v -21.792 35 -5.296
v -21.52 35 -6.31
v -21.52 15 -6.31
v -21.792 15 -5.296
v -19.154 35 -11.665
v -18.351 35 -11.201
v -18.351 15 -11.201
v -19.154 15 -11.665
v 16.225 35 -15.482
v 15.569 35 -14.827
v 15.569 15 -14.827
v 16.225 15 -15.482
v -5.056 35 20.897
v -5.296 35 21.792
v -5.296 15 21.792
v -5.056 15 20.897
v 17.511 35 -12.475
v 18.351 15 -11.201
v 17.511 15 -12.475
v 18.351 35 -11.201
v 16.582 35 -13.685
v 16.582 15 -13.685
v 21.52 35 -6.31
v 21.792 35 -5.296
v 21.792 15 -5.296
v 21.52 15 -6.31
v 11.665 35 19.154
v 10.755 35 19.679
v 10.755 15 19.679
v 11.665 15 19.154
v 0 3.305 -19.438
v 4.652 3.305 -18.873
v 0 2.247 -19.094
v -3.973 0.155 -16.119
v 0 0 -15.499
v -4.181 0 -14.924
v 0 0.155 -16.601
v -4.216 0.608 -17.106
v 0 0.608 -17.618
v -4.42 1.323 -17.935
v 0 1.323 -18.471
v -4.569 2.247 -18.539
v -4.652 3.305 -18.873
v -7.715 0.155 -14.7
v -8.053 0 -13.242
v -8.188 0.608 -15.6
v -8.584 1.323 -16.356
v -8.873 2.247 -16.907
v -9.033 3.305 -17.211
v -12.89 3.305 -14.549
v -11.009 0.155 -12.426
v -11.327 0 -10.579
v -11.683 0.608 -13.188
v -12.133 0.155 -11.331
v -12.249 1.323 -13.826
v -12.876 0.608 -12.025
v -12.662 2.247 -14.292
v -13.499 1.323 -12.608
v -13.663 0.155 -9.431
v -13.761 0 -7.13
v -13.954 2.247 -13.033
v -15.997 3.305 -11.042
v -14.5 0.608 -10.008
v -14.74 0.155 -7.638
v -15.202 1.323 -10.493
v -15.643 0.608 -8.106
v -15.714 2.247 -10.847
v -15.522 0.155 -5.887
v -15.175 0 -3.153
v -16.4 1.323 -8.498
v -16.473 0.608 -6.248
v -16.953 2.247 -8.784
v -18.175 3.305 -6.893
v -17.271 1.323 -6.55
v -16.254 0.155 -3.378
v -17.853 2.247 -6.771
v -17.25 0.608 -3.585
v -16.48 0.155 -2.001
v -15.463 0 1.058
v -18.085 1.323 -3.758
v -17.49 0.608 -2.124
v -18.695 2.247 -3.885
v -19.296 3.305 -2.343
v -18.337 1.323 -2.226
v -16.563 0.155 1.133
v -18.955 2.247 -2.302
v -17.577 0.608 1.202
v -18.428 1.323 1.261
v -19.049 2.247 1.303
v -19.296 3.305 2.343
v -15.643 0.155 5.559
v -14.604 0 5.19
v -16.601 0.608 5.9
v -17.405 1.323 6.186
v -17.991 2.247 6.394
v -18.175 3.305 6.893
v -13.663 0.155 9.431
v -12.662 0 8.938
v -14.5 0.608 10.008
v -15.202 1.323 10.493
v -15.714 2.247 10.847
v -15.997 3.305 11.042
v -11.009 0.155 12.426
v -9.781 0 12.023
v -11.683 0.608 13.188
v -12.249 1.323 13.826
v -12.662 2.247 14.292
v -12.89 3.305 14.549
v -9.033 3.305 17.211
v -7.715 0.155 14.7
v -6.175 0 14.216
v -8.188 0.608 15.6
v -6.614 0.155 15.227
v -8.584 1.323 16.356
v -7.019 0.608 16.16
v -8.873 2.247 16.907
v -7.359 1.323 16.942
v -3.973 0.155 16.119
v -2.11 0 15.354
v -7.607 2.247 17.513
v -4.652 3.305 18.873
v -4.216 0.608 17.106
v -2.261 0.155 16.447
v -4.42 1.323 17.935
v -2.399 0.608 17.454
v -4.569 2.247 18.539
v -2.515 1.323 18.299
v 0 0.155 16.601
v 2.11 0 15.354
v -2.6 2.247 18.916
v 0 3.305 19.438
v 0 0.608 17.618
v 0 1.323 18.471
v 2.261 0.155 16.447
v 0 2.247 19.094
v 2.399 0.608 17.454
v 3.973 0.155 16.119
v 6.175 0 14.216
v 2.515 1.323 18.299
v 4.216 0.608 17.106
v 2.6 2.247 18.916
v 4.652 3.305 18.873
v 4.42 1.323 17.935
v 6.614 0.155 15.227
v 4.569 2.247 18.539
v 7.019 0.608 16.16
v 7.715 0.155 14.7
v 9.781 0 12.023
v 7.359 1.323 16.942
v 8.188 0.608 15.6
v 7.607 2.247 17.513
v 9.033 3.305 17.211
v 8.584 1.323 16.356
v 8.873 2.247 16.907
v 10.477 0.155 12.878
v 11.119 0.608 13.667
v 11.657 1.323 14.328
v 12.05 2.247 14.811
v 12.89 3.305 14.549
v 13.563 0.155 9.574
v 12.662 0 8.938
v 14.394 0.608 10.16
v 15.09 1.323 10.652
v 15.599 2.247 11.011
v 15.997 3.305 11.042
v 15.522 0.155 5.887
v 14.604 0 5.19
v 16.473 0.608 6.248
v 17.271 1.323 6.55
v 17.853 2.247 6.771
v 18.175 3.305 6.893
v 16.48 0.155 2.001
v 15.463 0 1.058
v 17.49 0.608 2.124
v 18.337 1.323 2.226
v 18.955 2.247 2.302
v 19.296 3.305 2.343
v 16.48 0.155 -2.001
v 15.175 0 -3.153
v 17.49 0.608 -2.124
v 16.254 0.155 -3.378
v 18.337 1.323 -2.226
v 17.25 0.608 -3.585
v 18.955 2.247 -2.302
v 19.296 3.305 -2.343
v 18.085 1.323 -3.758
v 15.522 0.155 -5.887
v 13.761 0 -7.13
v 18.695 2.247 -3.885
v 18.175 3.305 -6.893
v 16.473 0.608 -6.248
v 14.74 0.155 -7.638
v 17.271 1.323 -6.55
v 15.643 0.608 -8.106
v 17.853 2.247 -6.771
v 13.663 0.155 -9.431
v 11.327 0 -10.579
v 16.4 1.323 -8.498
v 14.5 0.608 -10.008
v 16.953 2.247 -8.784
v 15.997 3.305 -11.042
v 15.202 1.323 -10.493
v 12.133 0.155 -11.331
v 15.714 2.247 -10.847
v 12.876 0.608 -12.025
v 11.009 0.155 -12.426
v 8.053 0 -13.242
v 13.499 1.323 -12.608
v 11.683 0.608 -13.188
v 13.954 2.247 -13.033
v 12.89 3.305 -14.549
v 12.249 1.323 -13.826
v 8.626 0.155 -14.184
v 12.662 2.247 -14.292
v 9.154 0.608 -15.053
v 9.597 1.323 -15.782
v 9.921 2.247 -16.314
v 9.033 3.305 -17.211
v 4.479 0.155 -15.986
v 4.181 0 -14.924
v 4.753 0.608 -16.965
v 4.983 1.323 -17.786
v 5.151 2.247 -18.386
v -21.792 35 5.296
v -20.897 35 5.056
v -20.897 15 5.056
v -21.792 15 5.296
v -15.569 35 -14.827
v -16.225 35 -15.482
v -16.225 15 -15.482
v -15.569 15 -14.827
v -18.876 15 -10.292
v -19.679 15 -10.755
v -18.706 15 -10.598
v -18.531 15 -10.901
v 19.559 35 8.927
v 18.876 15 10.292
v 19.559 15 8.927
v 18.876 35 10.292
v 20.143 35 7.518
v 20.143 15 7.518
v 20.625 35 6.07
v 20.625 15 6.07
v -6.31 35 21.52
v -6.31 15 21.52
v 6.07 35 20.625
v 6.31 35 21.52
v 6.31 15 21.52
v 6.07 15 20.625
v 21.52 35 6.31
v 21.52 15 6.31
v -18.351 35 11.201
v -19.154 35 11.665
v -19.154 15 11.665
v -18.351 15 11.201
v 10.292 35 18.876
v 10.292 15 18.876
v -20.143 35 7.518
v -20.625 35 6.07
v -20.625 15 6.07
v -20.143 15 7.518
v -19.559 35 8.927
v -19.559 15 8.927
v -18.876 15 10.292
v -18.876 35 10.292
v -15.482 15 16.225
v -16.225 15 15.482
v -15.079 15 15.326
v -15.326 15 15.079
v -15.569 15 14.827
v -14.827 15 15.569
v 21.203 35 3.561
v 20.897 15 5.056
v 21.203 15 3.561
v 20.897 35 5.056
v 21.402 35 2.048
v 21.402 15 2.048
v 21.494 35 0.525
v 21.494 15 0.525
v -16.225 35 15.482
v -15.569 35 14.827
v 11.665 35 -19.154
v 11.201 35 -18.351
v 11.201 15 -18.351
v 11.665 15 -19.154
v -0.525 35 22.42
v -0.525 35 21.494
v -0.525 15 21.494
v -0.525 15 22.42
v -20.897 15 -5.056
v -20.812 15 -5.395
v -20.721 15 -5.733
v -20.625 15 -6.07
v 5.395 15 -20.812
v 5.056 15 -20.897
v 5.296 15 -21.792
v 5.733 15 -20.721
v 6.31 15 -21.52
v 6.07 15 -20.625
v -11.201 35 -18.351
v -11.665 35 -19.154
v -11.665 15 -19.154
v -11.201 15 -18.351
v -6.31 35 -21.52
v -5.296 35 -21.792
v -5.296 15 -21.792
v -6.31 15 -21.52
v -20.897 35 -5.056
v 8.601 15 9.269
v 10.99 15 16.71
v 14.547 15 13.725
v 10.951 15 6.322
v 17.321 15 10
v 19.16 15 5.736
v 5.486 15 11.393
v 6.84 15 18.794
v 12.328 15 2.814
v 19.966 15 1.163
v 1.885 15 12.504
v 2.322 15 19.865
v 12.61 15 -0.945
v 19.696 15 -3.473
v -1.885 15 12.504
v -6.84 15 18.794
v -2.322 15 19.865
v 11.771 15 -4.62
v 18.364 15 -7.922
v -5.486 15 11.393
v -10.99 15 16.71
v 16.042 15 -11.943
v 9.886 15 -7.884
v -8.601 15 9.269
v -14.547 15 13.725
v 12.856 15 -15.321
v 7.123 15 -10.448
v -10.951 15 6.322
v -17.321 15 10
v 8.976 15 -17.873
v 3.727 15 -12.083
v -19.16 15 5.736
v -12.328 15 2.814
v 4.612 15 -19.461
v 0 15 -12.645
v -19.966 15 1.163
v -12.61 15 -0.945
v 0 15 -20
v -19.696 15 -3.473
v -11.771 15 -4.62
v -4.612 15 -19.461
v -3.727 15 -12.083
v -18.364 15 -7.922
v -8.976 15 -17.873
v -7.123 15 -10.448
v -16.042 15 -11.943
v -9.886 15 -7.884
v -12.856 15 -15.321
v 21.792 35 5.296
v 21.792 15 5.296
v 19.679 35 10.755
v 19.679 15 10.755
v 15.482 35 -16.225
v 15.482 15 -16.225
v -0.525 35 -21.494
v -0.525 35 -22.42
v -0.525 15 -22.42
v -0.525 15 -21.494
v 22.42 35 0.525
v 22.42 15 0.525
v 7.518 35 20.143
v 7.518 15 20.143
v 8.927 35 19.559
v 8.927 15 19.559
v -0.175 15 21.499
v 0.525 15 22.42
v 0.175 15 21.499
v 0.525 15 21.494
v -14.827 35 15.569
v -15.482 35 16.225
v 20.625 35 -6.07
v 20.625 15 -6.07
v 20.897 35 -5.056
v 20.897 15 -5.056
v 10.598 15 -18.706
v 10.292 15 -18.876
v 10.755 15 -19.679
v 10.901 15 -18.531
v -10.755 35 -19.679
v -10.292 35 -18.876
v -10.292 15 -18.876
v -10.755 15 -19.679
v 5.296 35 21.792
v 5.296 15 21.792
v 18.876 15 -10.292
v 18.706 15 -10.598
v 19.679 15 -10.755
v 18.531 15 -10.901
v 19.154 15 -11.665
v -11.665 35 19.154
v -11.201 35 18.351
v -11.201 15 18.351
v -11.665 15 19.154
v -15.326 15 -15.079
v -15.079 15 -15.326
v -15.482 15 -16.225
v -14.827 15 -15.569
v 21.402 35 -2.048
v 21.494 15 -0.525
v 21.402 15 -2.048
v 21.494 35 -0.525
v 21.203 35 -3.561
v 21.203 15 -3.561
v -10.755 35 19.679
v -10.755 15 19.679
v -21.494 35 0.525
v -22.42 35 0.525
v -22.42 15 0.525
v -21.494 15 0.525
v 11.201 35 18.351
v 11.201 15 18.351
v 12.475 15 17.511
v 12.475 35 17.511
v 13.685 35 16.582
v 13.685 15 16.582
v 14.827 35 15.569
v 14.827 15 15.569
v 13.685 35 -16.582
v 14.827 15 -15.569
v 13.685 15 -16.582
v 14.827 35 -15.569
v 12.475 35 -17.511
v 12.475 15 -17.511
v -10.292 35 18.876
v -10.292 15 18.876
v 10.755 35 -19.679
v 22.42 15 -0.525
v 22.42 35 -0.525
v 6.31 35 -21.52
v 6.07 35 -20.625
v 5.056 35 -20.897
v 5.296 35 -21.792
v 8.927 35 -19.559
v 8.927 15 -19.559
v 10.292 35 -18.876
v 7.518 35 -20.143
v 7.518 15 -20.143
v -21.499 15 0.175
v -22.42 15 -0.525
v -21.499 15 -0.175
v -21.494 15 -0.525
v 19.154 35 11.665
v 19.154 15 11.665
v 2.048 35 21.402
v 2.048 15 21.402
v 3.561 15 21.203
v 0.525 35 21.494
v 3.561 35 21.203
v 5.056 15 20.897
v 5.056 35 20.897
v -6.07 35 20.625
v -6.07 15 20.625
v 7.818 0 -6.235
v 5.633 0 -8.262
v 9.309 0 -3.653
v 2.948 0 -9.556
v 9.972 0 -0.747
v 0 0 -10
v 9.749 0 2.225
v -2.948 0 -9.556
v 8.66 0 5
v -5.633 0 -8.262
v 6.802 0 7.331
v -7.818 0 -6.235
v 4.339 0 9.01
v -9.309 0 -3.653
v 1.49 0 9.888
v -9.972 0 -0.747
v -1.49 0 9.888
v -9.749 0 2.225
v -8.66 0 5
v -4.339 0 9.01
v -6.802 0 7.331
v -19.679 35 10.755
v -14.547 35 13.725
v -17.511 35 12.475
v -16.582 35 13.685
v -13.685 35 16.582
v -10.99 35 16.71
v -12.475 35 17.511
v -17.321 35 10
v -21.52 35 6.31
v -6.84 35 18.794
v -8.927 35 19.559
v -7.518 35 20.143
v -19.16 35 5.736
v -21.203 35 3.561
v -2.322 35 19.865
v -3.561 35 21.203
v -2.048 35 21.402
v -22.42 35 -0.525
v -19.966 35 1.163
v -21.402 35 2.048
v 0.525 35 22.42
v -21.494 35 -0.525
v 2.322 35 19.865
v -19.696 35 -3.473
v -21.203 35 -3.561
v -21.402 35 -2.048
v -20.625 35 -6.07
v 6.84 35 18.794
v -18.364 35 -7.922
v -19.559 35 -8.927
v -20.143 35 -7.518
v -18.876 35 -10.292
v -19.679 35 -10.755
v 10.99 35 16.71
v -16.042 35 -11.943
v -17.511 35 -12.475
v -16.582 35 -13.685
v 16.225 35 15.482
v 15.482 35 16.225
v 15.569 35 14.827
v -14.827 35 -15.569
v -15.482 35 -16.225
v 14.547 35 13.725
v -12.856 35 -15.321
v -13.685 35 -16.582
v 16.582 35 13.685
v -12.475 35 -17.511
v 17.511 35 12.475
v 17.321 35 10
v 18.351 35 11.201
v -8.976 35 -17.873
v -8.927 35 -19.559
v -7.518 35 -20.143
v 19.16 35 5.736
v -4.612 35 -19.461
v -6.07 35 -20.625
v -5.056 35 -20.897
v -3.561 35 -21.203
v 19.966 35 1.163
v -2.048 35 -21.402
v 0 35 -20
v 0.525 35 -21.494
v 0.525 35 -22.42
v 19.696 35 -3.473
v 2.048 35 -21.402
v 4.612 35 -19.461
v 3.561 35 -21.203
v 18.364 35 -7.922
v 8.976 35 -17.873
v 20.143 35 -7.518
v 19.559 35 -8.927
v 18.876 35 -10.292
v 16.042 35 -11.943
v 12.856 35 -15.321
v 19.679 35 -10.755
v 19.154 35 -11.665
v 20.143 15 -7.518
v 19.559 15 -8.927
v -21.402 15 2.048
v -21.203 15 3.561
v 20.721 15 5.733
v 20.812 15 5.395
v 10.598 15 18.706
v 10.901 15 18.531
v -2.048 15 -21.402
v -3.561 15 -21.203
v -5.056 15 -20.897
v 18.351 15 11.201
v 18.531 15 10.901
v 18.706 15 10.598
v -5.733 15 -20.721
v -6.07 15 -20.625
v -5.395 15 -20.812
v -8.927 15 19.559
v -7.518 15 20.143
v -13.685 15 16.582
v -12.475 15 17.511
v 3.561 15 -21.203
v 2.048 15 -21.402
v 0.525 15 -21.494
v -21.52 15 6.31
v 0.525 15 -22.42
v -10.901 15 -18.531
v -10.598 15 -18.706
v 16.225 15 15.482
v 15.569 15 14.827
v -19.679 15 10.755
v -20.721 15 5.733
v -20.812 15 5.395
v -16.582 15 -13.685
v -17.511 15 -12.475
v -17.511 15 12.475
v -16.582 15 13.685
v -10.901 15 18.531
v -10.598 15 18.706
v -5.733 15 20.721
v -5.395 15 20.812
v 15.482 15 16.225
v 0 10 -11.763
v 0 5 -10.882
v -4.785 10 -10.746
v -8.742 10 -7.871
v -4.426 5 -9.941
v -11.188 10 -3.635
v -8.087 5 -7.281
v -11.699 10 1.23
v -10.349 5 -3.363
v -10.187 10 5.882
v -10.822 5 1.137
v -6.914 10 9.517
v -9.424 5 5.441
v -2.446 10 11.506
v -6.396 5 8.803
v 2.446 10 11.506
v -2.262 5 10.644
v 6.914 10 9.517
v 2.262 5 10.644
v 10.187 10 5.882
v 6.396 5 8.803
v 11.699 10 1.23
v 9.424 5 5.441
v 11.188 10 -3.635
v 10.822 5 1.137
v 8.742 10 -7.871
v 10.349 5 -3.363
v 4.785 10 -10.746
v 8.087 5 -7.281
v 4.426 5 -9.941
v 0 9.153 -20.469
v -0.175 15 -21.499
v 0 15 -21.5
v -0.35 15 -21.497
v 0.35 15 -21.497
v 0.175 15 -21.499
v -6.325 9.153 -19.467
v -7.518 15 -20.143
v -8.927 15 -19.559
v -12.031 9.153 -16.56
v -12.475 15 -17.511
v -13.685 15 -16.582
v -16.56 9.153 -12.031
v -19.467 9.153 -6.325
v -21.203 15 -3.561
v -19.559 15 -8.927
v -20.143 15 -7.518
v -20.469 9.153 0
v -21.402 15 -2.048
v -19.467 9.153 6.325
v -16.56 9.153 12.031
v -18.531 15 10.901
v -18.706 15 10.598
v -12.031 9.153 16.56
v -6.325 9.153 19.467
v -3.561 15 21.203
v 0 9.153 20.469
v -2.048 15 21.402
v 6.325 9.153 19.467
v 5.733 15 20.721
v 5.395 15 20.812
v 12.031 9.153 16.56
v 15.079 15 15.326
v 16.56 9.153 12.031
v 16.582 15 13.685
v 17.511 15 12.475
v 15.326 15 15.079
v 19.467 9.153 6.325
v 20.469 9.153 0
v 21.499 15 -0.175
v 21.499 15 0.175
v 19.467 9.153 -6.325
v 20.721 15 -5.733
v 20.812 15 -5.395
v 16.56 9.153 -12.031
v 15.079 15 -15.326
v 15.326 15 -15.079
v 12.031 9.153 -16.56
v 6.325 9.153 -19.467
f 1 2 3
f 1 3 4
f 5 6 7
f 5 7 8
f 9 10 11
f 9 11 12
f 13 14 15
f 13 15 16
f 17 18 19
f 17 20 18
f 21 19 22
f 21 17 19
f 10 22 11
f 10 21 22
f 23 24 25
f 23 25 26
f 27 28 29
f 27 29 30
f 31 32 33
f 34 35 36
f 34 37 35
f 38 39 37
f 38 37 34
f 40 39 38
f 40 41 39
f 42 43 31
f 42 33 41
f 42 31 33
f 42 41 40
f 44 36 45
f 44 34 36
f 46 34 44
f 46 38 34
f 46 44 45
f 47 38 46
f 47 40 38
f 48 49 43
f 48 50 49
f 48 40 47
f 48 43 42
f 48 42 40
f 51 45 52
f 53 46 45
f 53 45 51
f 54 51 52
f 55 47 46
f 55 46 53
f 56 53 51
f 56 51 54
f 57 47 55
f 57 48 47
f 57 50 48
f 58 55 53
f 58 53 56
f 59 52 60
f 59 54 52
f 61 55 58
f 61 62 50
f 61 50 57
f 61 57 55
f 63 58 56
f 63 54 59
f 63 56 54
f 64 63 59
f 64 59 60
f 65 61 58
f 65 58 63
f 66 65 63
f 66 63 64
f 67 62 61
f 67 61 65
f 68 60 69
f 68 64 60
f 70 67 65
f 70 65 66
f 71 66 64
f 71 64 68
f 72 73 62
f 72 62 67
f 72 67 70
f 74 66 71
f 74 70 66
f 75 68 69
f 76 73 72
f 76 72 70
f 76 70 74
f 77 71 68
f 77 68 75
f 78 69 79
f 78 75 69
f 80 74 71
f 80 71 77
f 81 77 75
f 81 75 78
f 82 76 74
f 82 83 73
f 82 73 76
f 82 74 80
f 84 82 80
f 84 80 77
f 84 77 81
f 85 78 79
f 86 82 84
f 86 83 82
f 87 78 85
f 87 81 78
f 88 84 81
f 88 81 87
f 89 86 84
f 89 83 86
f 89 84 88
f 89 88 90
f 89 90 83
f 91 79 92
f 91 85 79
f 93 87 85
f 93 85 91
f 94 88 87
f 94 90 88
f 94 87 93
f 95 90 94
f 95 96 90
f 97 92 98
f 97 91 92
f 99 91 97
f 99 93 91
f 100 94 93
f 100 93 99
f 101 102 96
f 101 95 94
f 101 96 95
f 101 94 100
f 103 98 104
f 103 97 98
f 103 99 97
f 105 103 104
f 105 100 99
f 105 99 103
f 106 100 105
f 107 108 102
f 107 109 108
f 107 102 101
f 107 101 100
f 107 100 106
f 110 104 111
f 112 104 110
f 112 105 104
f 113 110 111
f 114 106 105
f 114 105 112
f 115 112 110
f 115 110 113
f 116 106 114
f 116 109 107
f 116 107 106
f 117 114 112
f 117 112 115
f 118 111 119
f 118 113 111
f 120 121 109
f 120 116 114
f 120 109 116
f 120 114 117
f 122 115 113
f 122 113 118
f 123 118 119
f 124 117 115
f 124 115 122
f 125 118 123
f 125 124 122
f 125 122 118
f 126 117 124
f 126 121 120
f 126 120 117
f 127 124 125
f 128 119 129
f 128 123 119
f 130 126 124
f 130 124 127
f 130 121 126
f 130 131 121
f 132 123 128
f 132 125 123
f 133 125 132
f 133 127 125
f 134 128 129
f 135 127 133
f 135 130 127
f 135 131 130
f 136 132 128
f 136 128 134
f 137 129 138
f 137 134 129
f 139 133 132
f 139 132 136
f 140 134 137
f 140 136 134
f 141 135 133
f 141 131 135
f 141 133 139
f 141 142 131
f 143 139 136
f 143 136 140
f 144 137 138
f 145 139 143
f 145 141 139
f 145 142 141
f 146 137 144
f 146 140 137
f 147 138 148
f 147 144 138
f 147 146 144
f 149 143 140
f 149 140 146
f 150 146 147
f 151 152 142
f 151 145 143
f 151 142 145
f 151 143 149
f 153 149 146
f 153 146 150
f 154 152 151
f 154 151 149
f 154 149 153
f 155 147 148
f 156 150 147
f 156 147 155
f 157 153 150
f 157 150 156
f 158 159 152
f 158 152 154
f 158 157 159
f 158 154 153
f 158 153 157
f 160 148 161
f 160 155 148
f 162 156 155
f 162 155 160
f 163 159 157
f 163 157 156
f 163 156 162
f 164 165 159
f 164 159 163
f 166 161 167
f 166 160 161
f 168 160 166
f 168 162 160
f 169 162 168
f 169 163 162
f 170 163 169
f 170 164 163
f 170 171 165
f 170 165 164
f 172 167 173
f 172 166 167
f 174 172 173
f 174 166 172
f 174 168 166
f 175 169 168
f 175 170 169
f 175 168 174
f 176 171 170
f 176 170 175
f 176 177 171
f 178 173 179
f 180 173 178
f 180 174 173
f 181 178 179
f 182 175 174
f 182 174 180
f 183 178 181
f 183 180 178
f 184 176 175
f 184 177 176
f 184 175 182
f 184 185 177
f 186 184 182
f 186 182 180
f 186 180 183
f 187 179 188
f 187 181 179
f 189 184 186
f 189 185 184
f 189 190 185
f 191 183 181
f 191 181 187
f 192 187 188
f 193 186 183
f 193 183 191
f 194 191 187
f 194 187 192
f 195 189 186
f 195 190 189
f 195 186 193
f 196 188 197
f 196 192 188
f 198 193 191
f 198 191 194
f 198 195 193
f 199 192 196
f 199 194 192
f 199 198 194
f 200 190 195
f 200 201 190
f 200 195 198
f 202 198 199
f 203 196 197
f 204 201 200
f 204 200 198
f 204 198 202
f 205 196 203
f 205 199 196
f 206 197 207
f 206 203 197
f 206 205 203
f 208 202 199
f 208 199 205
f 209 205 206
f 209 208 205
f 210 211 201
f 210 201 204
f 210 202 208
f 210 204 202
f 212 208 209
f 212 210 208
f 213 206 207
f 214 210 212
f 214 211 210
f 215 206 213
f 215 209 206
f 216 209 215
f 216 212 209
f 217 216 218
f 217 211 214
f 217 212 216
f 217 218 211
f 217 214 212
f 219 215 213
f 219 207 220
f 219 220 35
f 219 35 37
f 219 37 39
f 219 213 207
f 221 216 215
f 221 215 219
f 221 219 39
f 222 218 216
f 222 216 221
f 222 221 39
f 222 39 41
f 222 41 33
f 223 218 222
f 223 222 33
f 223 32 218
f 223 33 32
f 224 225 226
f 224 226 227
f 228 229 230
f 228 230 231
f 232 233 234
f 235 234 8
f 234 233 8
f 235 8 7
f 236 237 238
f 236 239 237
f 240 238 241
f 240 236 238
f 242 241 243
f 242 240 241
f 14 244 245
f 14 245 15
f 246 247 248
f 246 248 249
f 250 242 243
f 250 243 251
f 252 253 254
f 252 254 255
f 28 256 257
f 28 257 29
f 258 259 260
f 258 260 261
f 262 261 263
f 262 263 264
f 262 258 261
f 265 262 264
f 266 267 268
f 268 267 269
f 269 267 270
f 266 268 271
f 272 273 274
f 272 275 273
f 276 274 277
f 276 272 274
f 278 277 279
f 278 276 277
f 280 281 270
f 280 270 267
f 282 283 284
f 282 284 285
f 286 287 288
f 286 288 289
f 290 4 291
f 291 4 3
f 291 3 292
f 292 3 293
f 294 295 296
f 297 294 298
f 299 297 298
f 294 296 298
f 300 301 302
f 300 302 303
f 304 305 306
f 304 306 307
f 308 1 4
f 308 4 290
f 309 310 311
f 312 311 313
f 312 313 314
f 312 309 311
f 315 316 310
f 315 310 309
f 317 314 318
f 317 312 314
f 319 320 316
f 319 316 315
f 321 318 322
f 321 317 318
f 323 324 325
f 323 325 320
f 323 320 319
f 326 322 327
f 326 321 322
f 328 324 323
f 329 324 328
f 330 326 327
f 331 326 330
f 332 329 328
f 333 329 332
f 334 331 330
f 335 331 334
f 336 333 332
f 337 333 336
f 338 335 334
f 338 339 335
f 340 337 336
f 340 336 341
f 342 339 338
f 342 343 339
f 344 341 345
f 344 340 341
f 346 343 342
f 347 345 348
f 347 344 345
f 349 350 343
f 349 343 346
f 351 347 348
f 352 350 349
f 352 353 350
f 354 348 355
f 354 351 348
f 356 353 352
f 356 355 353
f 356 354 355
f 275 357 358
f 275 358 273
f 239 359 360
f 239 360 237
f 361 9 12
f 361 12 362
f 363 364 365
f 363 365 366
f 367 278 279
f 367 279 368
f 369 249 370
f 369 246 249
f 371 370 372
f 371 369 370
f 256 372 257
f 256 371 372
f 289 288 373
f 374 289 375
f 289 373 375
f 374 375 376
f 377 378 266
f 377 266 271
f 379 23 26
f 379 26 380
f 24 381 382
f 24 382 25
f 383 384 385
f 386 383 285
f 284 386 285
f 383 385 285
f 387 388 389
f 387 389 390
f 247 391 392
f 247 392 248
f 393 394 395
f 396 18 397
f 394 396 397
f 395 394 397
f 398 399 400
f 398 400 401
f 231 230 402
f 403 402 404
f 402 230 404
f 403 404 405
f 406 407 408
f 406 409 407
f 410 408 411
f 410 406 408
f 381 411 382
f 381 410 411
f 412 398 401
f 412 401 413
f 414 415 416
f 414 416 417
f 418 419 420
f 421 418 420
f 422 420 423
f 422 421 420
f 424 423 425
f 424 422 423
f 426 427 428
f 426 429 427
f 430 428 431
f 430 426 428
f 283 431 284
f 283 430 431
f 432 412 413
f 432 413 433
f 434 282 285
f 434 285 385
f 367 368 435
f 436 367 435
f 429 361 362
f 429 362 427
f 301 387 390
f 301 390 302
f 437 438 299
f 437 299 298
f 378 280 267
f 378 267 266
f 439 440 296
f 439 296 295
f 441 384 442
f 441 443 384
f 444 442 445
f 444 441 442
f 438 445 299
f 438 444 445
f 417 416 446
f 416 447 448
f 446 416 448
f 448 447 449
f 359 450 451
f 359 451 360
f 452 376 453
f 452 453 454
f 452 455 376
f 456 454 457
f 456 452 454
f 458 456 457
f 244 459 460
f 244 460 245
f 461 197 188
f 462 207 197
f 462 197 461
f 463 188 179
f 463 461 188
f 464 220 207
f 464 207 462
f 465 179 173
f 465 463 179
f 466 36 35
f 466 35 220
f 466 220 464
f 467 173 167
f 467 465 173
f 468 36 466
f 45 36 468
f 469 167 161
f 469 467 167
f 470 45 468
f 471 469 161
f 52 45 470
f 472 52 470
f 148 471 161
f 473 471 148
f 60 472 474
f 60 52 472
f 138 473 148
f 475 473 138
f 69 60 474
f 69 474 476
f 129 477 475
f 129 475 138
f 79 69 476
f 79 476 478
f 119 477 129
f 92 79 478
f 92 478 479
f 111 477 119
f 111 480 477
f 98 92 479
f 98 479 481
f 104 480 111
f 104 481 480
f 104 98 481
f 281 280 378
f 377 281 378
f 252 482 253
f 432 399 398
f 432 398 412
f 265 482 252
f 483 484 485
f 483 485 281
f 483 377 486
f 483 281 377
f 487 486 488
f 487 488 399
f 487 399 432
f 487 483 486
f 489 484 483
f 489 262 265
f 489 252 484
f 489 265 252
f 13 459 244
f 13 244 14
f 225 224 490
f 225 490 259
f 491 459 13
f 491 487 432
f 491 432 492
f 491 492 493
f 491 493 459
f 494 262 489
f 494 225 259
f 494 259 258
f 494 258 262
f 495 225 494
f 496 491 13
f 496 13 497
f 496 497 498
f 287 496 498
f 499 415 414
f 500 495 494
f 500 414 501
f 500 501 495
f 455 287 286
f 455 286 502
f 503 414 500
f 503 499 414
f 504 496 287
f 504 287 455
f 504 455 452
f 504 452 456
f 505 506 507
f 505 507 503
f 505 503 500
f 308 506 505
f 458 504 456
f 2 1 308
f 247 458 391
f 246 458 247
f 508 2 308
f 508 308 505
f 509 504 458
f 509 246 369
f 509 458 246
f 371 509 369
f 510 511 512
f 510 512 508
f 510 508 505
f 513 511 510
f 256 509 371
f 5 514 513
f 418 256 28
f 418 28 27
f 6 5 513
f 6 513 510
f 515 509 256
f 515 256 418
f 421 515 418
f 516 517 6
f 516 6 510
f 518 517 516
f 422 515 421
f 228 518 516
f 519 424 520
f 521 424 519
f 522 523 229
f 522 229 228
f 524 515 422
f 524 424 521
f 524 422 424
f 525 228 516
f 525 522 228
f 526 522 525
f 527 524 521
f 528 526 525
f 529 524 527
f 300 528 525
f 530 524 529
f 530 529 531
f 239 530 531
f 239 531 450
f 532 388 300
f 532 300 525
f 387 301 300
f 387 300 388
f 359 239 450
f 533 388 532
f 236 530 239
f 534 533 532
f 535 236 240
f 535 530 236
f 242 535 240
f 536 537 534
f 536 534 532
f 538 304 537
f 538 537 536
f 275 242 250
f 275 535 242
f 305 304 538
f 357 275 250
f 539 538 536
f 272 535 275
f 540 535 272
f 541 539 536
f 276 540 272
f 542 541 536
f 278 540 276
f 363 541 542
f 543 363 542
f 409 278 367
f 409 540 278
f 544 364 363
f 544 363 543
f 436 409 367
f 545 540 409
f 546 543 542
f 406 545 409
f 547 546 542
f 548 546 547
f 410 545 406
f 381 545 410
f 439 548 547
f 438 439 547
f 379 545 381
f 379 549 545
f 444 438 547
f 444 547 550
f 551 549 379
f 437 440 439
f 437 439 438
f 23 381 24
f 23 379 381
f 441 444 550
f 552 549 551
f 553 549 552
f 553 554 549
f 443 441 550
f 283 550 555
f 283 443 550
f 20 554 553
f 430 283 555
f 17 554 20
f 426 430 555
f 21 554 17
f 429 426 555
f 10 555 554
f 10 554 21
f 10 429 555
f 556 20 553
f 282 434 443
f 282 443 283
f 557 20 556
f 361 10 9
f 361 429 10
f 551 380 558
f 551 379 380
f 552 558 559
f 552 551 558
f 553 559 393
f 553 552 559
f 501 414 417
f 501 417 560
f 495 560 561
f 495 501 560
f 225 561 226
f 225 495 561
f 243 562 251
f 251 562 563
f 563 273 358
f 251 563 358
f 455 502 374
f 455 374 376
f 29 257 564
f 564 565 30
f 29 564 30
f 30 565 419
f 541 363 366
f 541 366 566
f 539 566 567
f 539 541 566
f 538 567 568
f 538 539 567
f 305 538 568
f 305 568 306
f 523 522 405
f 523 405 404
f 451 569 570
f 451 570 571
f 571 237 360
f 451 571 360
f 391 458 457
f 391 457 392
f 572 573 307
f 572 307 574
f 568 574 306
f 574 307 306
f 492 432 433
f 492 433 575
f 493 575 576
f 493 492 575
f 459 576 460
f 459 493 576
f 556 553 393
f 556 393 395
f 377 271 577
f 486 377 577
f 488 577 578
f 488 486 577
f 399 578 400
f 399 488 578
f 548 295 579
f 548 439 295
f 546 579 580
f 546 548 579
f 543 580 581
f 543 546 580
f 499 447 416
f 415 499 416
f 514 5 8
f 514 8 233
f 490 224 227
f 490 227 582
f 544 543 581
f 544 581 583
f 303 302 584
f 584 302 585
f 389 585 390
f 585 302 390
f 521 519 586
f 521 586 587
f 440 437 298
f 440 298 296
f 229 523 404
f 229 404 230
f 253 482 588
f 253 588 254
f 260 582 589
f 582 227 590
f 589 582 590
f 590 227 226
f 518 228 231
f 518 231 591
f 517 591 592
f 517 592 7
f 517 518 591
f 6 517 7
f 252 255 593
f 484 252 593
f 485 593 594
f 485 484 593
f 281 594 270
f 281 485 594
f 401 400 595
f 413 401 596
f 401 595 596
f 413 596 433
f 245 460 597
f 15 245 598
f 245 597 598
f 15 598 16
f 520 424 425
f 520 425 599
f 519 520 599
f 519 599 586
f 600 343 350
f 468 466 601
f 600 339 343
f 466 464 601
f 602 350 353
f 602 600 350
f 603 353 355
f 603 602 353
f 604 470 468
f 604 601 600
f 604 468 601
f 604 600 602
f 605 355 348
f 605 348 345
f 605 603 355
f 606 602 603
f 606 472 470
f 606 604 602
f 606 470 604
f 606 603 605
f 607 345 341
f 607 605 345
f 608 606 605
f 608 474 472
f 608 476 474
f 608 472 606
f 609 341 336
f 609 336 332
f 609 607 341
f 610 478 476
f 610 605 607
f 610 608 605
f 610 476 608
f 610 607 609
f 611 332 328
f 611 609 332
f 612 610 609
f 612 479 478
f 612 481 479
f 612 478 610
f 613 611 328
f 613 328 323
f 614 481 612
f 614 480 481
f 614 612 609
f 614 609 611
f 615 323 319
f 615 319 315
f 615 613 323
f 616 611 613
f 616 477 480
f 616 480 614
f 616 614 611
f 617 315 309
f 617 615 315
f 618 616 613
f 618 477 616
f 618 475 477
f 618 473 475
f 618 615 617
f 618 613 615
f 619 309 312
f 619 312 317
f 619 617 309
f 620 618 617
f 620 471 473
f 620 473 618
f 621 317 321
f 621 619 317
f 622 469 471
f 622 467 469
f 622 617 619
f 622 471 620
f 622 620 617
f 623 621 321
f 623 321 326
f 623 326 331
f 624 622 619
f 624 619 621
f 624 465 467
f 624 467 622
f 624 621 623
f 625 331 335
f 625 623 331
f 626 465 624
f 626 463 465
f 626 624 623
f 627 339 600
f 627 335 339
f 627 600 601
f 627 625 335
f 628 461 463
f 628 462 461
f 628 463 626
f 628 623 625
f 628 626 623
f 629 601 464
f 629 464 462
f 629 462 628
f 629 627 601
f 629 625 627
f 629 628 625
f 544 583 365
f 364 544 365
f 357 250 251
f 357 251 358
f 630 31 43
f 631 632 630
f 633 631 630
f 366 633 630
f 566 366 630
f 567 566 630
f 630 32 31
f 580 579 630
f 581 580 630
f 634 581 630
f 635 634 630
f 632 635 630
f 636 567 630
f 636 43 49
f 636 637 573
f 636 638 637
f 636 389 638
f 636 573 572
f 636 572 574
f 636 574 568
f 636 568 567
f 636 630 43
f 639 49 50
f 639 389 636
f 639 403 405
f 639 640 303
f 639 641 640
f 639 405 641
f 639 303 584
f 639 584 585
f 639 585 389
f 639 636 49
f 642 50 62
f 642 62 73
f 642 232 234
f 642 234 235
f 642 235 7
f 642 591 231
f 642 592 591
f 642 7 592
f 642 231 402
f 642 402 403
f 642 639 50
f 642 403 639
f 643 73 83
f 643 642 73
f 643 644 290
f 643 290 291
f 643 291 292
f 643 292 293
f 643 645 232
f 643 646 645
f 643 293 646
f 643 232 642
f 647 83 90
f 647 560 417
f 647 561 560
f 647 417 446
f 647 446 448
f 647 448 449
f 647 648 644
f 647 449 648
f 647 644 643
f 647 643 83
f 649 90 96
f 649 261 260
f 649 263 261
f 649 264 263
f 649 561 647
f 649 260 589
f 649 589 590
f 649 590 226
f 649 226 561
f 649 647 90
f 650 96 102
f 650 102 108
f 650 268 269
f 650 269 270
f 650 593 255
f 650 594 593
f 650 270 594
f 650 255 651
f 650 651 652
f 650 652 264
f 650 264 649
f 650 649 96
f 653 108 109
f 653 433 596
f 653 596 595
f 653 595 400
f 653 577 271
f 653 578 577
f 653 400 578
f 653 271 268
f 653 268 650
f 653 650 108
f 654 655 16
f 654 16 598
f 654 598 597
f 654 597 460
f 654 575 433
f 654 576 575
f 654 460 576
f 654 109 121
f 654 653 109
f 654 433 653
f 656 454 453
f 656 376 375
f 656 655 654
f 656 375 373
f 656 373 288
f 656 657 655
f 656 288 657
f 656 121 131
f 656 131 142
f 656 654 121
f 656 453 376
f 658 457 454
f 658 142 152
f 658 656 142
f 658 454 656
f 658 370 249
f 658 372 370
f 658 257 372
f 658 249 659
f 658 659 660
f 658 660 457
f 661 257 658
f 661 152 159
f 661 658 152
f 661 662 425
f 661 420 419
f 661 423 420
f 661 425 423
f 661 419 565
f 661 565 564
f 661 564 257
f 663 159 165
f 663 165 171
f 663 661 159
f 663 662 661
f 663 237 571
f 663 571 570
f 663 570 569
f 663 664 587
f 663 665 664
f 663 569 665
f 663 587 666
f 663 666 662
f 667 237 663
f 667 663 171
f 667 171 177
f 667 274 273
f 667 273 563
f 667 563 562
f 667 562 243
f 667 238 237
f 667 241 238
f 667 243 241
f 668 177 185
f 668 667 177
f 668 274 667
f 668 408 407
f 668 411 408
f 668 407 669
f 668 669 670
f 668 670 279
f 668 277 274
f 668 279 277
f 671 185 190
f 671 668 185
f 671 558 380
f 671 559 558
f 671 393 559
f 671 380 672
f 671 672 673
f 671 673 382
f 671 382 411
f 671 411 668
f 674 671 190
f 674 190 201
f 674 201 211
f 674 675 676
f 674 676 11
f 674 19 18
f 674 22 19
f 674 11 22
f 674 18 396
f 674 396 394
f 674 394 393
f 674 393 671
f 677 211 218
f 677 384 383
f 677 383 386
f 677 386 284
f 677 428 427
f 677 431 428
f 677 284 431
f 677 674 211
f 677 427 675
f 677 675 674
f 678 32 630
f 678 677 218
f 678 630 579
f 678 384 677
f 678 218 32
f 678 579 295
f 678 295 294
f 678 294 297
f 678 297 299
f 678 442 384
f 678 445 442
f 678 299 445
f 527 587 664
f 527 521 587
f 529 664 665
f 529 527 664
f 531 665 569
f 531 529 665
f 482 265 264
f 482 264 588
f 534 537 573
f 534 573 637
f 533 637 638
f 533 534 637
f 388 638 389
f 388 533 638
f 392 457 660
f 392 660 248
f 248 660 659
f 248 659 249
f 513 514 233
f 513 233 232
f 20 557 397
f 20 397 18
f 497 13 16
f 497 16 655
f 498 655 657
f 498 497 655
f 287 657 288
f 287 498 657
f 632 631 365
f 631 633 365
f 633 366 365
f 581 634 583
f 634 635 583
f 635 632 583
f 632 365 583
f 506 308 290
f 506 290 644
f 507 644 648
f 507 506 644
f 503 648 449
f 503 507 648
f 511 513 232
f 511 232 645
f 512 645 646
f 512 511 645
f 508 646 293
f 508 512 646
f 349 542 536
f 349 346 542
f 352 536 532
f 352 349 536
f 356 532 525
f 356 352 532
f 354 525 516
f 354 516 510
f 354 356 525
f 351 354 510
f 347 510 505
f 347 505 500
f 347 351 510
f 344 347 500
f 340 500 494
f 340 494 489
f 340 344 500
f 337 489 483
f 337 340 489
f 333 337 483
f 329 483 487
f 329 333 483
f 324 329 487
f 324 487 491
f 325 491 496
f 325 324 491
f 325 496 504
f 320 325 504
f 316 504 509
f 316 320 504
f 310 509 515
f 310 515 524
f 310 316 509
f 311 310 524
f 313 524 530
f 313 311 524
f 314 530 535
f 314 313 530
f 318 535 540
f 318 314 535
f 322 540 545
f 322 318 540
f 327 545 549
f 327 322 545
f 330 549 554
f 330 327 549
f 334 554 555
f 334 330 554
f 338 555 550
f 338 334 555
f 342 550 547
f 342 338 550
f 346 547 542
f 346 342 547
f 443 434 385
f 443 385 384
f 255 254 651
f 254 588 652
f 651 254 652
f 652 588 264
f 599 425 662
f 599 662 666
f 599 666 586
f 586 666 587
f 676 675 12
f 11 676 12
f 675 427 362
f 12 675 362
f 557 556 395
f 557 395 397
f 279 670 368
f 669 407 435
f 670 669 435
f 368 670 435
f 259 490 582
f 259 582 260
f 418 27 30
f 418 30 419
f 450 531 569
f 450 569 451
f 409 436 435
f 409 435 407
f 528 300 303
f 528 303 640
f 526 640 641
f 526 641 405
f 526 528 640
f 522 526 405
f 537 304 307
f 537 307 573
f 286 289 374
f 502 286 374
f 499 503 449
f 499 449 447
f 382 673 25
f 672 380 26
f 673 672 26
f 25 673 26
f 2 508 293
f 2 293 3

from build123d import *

# Parameters (mm, degrees)
BOSS_EXTRUDE1_DEPTH = 20


with BuildPart() as part:
    # Sketch1 → Revolve1 (revolve)
    with BuildSketch(Plane.XY, mode=Mode.PRIVATE) as revolve1_sk:
        with BuildLine():
            Line((12.644904711, 15), (10, 0))
            Line((10, 0), (15.498696765, 0))
            ThreePointArc((15.498696765, 0), (18.069847203, 0.935822228), (19.437927777, 3.305407289))
            Line((19.437927777, 3.305407289), (21.5, 15))
            Line((21.5, 15), (21.5, 35))
            Line((21.5, 35), (20, 35))
            Line((20, 35), (20, 15))
            Line((20, 15), (12.644904711, 15))
        make_face()
    revolve(revolve1_sk.sketch.rotate(Axis((0, 0, 0), (0, 1, 0)), 90), axis=Axis((0, 0, 0), (0, 1, 0)))

    # Sketch2 → Boss-Extrude1 (add)
    with BuildSketch(Plane(origin=(0, 35, 0), x_dir=(1, 0, 0), z_dir=(0, 1, 0))):
        with BuildLine():
            Line((21.49358916, -0.525), (22.42, -0.525))
            Line((22.42, -0.525), (22.42, 0.525))
            Line((22.42, 0.525), (21.49358916, 0.525))
            ThreePointArc((21.49358916, 0.525), (21.5, 0), (21.49358916, -0.525))
        make_face()
        with BuildLine():
            Line((20.625332871, -6.070061281), (21.520177027, -6.30983405))
            Line((21.520177027, -6.30983405), (21.791937024, -5.295611932))
            Line((21.791937024, -5.295611932), (20.897092868, -5.055839164))
            ThreePointArc((20.897092868, -5.055839164), (20.767405265, -5.56460947), (20.625332871, -6.070061281))
        make_face()
        with BuildLine():
            Line((18.351494231, -11.201457917), (19.153789553, -11.664663337))
            Line((19.153789553, -11.664663337), (19.678789553, -10.755336663))
            Line((19.678789553, -10.755336663), (18.876494231, -10.292131243))
            ThreePointArc((18.876494231, -10.292131243), (18.619546181, -10.75), (18.351494231, -11.201457917))
        make_face()
        with BuildLine():
            Line((14.827031587, -15.569493708), (15.482102974, -16.224565094))
            Line((15.482102974, -16.224565094), (16.224565094, -15.482102974))
            Line((16.224565094, -15.482102974), (15.569493708, -14.827031587))
            ThreePointArc((15.569493708, -14.827031587), (15.202795796, -15.202795796), (14.827031587, -15.569493708))
        make_face()
        with BuildLine():
            Line((10.292131243, -18.876494231), (10.755336663, -19.678789553))
            Line((10.755336663, -19.678789553), (11.664663337, -19.153789553))
            Line((11.664663337, -19.153789553), (11.201457917, -18.351494231))
            ThreePointArc((11.201457917, -18.351494231), (10.75, -18.619546181), (10.292131243, -18.876494231))
        make_face()
        with BuildLine():
            Line((5.055839164, -20.897092868), (5.295611932, -21.791937024))
            Line((5.295611932, -21.791937024), (6.30983405, -21.520177027))
            Line((6.30983405, -21.520177027), (6.070061281, -20.625332871))
            ThreePointArc((6.070061281, -20.625332871), (5.56460947, -20.767405265), (5.055839164, -20.897092868))
        make_face()
        with BuildLine():
            Line((-0.525, -21.49358916), (-0.525, -22.42))
            Line((-0.525, -22.42), (0.525, -22.42))
            Line((0.525, -22.42), (0.525, -21.49358916))
            ThreePointArc((0.525, -21.49358916), (0, -21.5), (-0.525, -21.49358916))
        make_face()
        with BuildLine():
            Line((-6.070061281, -20.625332871), (-6.30983405, -21.520177027))
            Line((-6.30983405, -21.520177027), (-5.295611932, -21.791937024))
            Line((-5.295611932, -21.791937024), (-5.055839164, -20.897092868))
            ThreePointArc((-5.055839164, -20.897092868), (-5.56460947, -20.767405265), (-6.070061281, -20.625332871))
        make_face()
        with BuildLine():
            Line((-11.201457917, -18.351494231), (-11.664663337, -19.153789553))
            Line((-11.664663337, -19.153789553), (-10.755336663, -19.678789553))
            Line((-10.755336663, -19.678789553), (-10.292131243, -18.876494231))
            ThreePointArc((-10.292131243, -18.876494231), (-10.75, -18.619546181), (-11.201457917, -18.351494231))
        make_face()
        with BuildLine():
            Line((-15.569493708, -14.827031587), (-16.224565094, -15.482102974))
            Line((-16.224565094, -15.482102974), (-15.482102974, -16.224565094))
            Line((-15.482102974, -16.224565094), (-14.827031587, -15.569493708))
            ThreePointArc((-14.827031587, -15.569493708), (-15.202795796, -15.202795796), (-15.569493708, -14.827031587))
        make_face()
        with BuildLine():
            Line((-18.876494231, -10.292131243), (-19.678789553, -10.755336663))
            Line((-19.678789553, -10.755336663), (-19.153789553, -11.664663337))
            Line((-19.153789553, -11.664663337), (-18.351494231, -11.201457917))
            ThreePointArc((-18.351494231, -11.201457917), (-18.619546181, -10.75), (-18.876494231, -10.292131243))
        make_face()
        with BuildLine():
            Line((-20.897092868, -5.055839164), (-21.791937024, -5.295611932))
            Line((-21.791937024, -5.295611932), (-21.520177027, -6.30983405))
            Line((-21.520177027, -6.30983405), (-20.625332871, -6.070061281))
            ThreePointArc((-20.625332871, -6.070061281), (-20.767405265, -5.56460947), (-20.897092868, -5.055839164))
        make_face()
        with BuildLine():
            Line((-21.49358916, 0.525), (-22.42, 0.525))
            Line((-22.42, 0.525), (-22.42, -0.525))
            Line((-22.42, -0.525), (-21.49358916, -0.525))
            ThreePointArc((-21.49358916, -0.525), (-21.5, 0), (-21.49358916, 0.525))
        make_face()
        with BuildLine():
            Line((-20.625332871, 6.070061281), (-21.520177027, 6.30983405))
            Line((-21.520177027, 6.30983405), (-21.791937024, 5.295611932))
            Line((-21.791937024, 5.295611932), (-20.897092868, 5.055839164))
            ThreePointArc((-20.897092868, 5.055839164), (-20.767405265, 5.56460947), (-20.625332871, 6.070061281))
        make_face()
        with BuildLine():
            Line((-18.351494231, 11.201457917), (-19.153789553, 11.664663337))
            Line((-19.153789553, 11.664663337), (-19.678789553, 10.755336663))
            Line((-19.678789553, 10.755336663), (-18.876494231, 10.292131243))
            ThreePointArc((-18.876494231, 10.292131243), (-18.619546181, 10.75), (-18.351494231, 11.201457917))
        make_face()
        with BuildLine():
            Line((-14.827031587, 15.569493708), (-15.482102974, 16.224565094))
            Line((-15.482102974, 16.224565094), (-16.224565094, 15.482102974))
            Line((-16.224565094, 15.482102974), (-15.569493708, 14.827031587))
            ThreePointArc((-15.569493708, 14.827031587), (-15.202795796, 15.202795796), (-14.827031587, 15.569493708))
        make_face()
        with BuildLine():
            Line((-10.292131243, 18.876494231), (-10.755336663, 19.678789553))
            Line((-10.755336663, 19.678789553), (-11.664663337, 19.153789553))
            Line((-11.664663337, 19.153789553), (-11.201457917, 18.351494231))
            ThreePointArc((-11.201457917, 18.351494231), (-10.75, 18.619546181), (-10.292131243, 18.876494231))
        make_face()
        with BuildLine():
            Line((-5.055839164, 20.897092868), (-5.295611932, 21.791937024))
            Line((-5.295611932, 21.791937024), (-6.30983405, 21.520177027))
            Line((-6.30983405, 21.520177027), (-6.070061281, 20.625332871))
            ThreePointArc((-6.070061281, 20.625332871), (-5.56460947, 20.767405265), (-5.055839164, 20.897092868))
        make_face()
        with BuildLine():
            Line((0.525, 21.49358916), (0.525, 22.42))
            Line((0.525, 22.42), (-0.525, 22.42))
            Line((-0.525, 22.42), (-0.525, 21.49358916))
            ThreePointArc((-0.525, 21.49358916), (0, 21.5), (0.525, 21.49358916))
        make_face()
        with BuildLine():
            Line((6.070061281, 20.625332871), (6.30983405, 21.520177027))
            Line((6.30983405, 21.520177027), (5.295611932, 21.791937024))
            Line((5.295611932, 21.791937024), (5.055839164, 20.897092868))
            ThreePointArc((5.055839164, 20.897092868), (5.56460947, 20.767405265), (6.070061281, 20.625332871))
        make_face()
        with BuildLine():
            Line((11.201457917, 18.351494231), (11.664663337, 19.153789553))
            Line((11.664663337, 19.153789553), (10.755336663, 19.678789553))
            Line((10.755336663, 19.678789553), (10.292131243, 18.876494231))
            ThreePointArc((10.292131243, 18.876494231), (10.75, 18.619546181), (11.201457917, 18.351494231))
        make_face()
        with BuildLine():
            Line((15.569493708, 14.827031587), (16.224565094, 15.482102974))
            Line((16.224565094, 15.482102974), (15.482102974, 16.224565094))
            Line((15.482102974, 16.224565094), (14.827031587, 15.569493708))
            ThreePointArc((14.827031587, 15.569493708), (15.202795796, 15.202795796), (15.569493708, 14.827031587))
        make_face()
        with BuildLine():
            Line((18.876494231, 10.292131243), (19.678789553, 10.755336663))
            Line((19.678789553, 10.755336663), (19.153789553, 11.664663337))
            Line((19.153789553, 11.664663337), (18.351494231, 11.201457917))
            ThreePointArc((18.351494231, 11.201457917), (18.619546181, 10.75), (18.876494231, 10.292131243))
        make_face()
        with BuildLine():
            Line((20.897092868, 5.055839164), (21.791937024, 5.295611932))
            Line((21.791937024, 5.295611932), (21.520177027, 6.30983405))
            Line((21.520177027, 6.30983405), (20.625332871, 6.070061281))
            ThreePointArc((20.625332871, 6.070061281), (20.767405265, 5.56460947), (20.897092868, 5.055839164))
        make_face()
    extrude(amount=-BOSS_EXTRUDE1_DEPTH)


solid = part.part
